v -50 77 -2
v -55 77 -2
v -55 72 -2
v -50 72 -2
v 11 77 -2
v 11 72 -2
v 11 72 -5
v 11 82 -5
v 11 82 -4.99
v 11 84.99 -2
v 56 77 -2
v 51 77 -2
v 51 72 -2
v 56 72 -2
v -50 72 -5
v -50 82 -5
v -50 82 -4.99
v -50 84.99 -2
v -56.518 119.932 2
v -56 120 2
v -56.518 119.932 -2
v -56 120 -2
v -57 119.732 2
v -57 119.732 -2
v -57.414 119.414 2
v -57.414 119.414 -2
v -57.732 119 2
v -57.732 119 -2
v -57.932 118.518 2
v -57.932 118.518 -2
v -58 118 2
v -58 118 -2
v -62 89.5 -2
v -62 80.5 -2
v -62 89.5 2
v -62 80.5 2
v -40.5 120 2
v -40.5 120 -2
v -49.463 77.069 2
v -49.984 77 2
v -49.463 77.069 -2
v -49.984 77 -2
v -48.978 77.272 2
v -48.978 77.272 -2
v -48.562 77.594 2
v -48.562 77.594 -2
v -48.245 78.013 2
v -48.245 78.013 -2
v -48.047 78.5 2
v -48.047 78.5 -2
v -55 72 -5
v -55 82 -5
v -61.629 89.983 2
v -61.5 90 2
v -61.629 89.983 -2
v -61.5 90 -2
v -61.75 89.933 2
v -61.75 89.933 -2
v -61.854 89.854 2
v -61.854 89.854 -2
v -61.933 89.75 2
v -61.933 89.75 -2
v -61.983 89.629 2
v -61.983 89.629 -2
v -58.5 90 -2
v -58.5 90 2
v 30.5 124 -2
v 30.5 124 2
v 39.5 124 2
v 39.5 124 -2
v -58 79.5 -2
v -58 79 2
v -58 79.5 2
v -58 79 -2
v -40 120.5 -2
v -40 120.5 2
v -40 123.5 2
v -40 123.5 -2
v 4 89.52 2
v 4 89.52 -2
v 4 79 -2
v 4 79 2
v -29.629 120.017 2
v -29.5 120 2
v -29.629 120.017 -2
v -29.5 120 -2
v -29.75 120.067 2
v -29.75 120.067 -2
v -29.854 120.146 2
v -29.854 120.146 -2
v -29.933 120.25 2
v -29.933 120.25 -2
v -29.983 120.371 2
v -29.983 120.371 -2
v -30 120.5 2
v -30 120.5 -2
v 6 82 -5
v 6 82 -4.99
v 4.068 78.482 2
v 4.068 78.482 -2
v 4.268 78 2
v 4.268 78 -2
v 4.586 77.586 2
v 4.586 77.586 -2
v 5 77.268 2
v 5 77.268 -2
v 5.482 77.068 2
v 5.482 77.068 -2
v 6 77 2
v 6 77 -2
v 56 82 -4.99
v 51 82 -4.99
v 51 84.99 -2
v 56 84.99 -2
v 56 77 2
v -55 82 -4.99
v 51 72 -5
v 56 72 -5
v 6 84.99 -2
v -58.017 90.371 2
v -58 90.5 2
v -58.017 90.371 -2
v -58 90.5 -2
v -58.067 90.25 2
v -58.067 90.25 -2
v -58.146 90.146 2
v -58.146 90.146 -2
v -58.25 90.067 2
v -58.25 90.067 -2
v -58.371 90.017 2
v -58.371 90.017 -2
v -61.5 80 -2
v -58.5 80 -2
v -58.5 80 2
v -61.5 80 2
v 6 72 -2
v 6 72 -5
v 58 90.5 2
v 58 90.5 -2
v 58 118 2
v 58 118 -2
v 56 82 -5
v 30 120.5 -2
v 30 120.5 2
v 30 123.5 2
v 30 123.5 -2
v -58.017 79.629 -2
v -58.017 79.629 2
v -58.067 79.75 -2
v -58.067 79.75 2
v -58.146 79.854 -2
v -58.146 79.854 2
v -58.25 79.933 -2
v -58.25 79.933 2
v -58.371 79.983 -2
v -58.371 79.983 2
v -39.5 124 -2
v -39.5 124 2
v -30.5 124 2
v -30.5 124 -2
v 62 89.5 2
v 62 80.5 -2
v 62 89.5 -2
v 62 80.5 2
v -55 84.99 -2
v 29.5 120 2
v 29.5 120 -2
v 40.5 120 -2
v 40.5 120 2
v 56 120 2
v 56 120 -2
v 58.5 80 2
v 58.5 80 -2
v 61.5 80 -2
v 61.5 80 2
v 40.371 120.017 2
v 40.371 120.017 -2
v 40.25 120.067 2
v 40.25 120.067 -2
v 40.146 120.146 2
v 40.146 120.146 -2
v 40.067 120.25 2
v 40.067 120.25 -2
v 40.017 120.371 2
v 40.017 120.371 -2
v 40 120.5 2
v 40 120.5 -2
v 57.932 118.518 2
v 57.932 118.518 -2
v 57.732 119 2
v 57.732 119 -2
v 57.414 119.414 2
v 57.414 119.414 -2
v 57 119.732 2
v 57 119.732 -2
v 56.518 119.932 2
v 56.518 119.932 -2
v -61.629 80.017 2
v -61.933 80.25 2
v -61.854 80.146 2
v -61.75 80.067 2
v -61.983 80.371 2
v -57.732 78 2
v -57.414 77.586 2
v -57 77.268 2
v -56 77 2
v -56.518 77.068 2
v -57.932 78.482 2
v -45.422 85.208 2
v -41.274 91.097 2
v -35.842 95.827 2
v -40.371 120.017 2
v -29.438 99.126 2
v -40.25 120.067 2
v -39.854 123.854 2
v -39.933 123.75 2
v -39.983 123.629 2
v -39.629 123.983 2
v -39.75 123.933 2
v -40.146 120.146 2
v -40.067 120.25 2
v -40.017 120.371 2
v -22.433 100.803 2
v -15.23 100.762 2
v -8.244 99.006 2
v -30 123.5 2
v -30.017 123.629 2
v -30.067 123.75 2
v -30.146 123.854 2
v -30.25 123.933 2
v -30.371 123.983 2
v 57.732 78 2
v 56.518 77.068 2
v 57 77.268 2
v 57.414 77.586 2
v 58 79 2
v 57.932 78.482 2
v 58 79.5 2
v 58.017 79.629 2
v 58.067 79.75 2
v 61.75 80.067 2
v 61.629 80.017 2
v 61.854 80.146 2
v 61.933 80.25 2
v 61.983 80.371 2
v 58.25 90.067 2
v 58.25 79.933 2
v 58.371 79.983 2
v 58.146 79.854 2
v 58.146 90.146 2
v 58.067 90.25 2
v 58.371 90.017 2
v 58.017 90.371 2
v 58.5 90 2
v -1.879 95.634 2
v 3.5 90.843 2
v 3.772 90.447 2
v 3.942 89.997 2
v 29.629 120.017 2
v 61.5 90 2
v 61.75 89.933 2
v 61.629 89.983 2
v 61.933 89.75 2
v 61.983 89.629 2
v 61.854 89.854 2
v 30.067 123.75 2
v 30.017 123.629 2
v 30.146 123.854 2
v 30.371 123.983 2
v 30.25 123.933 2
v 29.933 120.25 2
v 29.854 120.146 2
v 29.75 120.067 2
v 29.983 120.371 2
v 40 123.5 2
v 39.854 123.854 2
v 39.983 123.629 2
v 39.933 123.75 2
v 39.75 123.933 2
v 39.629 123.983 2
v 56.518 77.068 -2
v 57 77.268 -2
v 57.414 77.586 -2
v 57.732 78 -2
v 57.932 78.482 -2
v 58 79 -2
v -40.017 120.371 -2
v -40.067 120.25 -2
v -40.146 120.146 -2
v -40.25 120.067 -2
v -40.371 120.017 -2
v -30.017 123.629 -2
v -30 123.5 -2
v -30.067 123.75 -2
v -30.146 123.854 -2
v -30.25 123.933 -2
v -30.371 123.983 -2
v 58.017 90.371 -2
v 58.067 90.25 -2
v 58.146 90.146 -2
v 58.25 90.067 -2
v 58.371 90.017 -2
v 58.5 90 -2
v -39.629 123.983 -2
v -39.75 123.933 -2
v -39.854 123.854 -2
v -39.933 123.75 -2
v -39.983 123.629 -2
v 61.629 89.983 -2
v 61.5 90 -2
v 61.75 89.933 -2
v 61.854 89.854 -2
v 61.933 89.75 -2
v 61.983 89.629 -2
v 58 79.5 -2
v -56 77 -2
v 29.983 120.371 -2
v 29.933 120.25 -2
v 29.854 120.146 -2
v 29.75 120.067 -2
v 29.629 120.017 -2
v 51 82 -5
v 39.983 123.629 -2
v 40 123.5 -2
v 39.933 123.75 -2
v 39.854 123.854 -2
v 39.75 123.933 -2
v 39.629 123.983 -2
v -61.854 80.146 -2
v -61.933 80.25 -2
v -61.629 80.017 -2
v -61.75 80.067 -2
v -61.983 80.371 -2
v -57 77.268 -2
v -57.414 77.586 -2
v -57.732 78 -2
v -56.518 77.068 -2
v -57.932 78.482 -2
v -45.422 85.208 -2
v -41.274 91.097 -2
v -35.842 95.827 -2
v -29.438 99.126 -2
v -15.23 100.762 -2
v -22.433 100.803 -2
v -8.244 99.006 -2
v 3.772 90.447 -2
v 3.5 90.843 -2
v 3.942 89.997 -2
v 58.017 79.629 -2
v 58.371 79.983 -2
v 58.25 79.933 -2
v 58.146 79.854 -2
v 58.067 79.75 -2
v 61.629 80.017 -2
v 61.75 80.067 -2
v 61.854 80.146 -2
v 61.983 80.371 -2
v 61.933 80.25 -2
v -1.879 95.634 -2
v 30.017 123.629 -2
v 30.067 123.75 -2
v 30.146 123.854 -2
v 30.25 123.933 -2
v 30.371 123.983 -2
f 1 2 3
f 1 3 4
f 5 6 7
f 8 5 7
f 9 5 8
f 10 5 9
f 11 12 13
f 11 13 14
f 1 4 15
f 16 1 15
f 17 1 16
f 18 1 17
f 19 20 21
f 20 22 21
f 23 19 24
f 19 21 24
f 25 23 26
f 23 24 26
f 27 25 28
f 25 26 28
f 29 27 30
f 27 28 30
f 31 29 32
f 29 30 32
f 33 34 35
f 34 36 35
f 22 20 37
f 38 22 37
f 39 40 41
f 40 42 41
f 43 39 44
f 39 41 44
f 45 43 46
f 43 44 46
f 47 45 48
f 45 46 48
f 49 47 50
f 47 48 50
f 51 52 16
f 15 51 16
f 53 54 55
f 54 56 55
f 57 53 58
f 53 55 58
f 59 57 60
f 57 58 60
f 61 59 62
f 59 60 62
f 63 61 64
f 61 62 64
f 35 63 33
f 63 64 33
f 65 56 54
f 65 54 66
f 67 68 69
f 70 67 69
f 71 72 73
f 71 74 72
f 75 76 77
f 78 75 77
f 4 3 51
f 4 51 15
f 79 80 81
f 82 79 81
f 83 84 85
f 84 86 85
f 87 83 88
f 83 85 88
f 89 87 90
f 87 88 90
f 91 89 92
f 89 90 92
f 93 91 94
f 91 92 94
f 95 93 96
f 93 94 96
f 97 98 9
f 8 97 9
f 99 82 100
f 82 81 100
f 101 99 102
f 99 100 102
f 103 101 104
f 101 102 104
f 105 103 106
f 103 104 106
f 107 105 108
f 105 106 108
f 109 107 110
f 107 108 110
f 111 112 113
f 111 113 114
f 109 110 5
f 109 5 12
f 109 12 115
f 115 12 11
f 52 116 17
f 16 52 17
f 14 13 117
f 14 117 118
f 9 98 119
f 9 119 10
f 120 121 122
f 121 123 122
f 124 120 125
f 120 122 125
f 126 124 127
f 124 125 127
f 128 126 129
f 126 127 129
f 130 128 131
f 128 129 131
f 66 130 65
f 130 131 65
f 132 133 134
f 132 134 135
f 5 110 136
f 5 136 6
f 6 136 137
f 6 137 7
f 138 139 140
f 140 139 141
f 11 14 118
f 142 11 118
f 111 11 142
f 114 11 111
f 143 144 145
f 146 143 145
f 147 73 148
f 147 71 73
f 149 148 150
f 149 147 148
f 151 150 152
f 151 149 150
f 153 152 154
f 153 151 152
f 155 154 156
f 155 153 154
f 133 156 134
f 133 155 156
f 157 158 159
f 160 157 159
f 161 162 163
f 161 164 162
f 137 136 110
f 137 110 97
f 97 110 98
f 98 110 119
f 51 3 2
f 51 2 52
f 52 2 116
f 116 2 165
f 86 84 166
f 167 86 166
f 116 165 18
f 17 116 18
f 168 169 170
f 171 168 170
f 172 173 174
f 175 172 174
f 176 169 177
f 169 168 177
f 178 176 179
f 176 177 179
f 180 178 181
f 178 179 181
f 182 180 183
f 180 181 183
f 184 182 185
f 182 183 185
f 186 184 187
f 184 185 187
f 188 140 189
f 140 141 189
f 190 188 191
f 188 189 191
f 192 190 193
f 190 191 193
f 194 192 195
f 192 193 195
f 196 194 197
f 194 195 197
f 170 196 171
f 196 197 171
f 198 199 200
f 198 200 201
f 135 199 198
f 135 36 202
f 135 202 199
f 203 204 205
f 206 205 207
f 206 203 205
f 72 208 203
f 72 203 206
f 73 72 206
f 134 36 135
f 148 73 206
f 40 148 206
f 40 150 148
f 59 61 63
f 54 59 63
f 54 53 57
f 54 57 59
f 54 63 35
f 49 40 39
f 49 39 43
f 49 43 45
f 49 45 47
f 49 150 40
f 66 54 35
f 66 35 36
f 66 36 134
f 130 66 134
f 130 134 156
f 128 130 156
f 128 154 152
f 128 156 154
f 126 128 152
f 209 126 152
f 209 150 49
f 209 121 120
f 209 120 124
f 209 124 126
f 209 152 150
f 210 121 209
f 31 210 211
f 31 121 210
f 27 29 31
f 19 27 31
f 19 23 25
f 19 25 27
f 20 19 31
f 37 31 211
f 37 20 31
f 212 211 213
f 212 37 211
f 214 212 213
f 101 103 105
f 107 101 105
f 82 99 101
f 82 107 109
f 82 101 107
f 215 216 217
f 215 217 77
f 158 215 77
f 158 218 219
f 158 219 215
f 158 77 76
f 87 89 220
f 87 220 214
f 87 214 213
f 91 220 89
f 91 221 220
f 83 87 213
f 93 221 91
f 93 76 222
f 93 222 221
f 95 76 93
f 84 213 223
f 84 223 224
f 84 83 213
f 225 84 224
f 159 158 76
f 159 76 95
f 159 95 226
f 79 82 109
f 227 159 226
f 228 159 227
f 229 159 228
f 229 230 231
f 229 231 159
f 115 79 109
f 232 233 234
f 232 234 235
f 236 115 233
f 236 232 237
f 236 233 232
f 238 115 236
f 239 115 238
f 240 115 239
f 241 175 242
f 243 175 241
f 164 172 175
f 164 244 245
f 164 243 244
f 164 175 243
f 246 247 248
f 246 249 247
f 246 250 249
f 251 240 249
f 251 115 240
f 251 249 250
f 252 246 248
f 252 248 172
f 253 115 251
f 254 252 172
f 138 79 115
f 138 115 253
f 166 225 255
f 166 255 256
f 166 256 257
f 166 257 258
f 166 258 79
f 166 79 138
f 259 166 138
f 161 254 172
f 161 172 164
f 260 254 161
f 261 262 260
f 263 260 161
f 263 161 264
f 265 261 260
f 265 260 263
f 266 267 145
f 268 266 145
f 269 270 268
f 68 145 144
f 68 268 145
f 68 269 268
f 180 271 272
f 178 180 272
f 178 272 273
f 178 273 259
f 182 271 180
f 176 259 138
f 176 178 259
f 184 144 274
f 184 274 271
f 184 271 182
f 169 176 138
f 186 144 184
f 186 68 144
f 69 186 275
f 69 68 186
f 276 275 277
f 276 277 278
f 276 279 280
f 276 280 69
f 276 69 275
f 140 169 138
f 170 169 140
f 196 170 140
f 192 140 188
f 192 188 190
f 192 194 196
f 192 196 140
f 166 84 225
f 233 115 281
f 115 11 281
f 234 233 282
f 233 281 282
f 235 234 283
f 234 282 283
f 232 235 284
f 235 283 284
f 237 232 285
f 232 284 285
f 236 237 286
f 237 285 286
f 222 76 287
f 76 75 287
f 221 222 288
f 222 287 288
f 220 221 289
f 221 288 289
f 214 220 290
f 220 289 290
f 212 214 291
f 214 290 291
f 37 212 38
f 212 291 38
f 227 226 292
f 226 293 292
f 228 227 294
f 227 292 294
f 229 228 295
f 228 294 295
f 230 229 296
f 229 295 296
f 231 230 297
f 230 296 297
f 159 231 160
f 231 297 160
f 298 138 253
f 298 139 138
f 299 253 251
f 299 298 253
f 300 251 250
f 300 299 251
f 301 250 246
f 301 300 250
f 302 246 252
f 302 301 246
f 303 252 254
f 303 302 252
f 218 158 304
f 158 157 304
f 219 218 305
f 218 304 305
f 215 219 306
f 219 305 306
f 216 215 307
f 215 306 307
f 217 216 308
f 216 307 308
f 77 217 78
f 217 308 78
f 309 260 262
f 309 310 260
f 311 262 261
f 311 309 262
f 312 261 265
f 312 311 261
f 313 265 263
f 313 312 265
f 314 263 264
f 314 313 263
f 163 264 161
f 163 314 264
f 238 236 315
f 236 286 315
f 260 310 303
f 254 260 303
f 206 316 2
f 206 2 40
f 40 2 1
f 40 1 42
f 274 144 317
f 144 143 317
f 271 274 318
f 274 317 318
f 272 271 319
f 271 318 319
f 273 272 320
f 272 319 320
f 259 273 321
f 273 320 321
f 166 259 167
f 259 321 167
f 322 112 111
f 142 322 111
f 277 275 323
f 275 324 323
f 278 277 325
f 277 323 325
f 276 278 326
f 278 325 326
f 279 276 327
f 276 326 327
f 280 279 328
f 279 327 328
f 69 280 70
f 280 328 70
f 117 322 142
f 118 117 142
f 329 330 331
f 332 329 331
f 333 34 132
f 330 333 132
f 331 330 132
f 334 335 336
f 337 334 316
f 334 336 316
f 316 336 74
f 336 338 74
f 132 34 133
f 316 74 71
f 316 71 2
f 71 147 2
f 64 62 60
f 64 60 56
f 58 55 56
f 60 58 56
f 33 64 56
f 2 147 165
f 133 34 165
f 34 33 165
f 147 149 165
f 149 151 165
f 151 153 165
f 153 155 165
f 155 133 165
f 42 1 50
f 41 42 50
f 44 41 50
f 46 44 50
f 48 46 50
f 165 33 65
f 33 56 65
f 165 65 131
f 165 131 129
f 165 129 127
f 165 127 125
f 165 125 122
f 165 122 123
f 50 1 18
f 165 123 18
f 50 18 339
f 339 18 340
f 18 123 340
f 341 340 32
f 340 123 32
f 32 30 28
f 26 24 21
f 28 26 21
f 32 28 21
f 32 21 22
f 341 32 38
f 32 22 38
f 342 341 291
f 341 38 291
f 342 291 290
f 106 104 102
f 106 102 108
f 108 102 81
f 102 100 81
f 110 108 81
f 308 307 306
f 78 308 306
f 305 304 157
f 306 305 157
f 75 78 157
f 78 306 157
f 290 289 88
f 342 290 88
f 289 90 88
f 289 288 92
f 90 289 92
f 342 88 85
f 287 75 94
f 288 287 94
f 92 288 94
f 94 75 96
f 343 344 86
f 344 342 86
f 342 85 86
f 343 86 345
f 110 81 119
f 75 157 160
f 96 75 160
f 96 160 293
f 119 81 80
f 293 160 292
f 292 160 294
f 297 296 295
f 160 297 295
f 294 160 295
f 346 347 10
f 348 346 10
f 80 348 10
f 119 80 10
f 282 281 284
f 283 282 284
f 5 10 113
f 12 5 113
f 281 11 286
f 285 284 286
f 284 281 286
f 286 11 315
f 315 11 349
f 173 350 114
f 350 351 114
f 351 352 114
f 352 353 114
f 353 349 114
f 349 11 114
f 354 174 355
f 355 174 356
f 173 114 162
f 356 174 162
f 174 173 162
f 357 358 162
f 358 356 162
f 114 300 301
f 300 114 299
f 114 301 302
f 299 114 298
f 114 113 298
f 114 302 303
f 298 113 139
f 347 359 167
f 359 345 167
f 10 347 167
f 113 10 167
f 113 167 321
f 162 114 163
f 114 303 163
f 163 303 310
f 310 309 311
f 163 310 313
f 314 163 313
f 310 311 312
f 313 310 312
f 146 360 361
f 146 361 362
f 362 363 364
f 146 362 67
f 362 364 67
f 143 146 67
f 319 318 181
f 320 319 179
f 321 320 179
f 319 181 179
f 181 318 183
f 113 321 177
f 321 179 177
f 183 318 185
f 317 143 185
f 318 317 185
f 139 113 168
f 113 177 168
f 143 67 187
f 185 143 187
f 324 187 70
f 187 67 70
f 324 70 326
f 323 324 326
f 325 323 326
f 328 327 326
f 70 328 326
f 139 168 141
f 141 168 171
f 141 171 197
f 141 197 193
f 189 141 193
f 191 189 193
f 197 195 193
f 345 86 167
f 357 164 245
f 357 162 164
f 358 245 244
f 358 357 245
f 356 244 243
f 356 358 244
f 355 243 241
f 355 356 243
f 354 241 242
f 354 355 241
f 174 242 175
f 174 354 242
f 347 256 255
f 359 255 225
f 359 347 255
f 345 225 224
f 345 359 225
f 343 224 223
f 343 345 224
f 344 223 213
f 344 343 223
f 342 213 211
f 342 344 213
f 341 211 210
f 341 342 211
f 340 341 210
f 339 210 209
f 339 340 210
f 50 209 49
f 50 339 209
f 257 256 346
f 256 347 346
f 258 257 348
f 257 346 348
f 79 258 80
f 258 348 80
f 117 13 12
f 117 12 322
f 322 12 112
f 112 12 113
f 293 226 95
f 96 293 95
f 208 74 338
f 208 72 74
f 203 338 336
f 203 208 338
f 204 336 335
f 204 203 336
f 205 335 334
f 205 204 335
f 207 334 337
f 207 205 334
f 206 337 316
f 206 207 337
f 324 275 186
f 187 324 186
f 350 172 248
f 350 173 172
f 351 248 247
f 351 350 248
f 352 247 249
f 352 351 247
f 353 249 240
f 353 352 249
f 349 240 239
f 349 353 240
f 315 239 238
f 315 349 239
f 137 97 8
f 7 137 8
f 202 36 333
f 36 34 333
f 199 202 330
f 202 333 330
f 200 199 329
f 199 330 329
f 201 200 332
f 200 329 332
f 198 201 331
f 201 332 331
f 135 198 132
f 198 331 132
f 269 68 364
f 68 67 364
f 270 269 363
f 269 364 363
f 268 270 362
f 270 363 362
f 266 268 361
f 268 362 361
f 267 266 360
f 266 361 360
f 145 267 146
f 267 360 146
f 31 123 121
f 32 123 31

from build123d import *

# Parameters (mm, degrees)
SKETCH_W             = 124
SKETCH_H             = 124
PAD_DEPTH            = 2
POCKET_DEPTH         = 2.001
POCKET_DEPTH_BACK    = -2.001
POCKET001_DEPTH      = 2.001
POCKET001_DEPTH_BACK = -2.001
SKETCH006_W          = 150
SKETCH006_H          = 77
POCKET002_DEPTH      = 2.001
POCKET002_DEPTH_BACK = -2.001
POCKET003_DEPTH      = 2.001
POCKET003_DEPTH_BACK = -2.001
FILLET_R             = 2
FILLET001_R          = 2
FILLET002_R          = 0.5
SKETCH008_W          = 5
SKETCH008_H          = 10
PAD001_DEPTH         = 3
CHAMFER_SIZE         = 2.99


with BuildPart() as part:
    # Sketch → Pad (new body, symmetric)
    with BuildSketch(Plane.XY):
        with Locations((0, 62)):
            Rectangle(SKETCH_W, SKETCH_H)
    extrude(amount=PAD_DEPTH, both=True)

    # Sketch004 → Pocket (cut, two sides)
    with BuildSketch(Plane.XY) as pocket_sk:
        Polygon((-58, 5), (-62, 5), (-62, 15), (-58, 15), (-58, 80), (-62, 80), (-62, 90), (-58, 90), (-58, 124), (-88, 124), (-88, 0), (-58, 0), align=None)
        Polygon((58, 5), (62, 5), (62, 15), (58, 15), (58, 80), (62, 80), (62, 90), (58, 90), (58, 124), (88, 124), (88, 0), (58, 0), align=None)
    extrude(amount=-POCKET_DEPTH, mode=Mode.SUBTRACT)
    extrude(pocket_sk.sketch, amount=-POCKET_DEPTH_BACK, mode=Mode.SUBTRACT)

    # Sketch005 → Pocket001 (cut, two sides)
    with BuildSketch(Plane.XY) as pocket001_sk:
        Polygon((-60, 120), (-40, 120), (-40, 124), (-30, 124), (-30, 120), (30, 120), (30, 124), (40, 124), (40, 120), (60, 120), (60, 130), (-60, 130), align=None)
    extrude(amount=-POCKET001_DEPTH, mode=Mode.SUBTRACT)
    extrude(pocket001_sk.sketch, amount=-POCKET001_DEPTH_BACK, mode=Mode.SUBTRACT)

    # Sketch006 → Pocket002 (cut, two sides)
    with BuildSketch(Plane.XY) as pocket002_sk:
        with Locations((0, 38.5)):
            Rectangle(SKETCH006_W, SKETCH006_H)
    extrude(amount=-POCKET002_DEPTH, mode=Mode.SUBTRACT)
    extrude(pocket002_sk.sketch, amount=-POCKET002_DEPTH_BACK, mode=Mode.SUBTRACT)

    # Sketch007 → Pocket003 (cut, two sides)
    with BuildSketch(Plane.XY) as pocket003_sk:
        with BuildLine():
            ThreePointArc((4, 90.26136), (-49, 71), (4, 51.73864))
            Line((4, 90.26136), (4, 51.73864))
        make_face()
    extrude(amount=-POCKET003_DEPTH, mode=Mode.SUBTRACT)
    extrude(pocket003_sk.sketch, amount=-POCKET003_DEPTH_BACK, mode=Mode.SUBTRACT)

    # Fillet
    fillet_edges = [part.edges().sort_by_distance(p)[0] for p in [
        (-48.393877, 77, 0),
        (4, 90.26136, 0),
        (4, 77, 0),
        (58, 77, 0),
        (-58, 77, 0),
    ]]
    fillet(fillet_edges, radius=FILLET_R)

    # Fillet001
    fillet001_edges = [part.edges().sort_by_distance(p)[0] for p in [
        (58, 120, 0),
        (-58, 120, 0),
    ]]
    fillet(fillet001_edges, radius=FILLET001_R)

    # Fillet002
    fillet002_edges = [part.edges().sort_by_distance(p)[0] for p in [
        (-58, 80, 0),
        (-62, 80, 0),
        (-62, 90, 0),
        (-58, 90, 0),
        (-40, 120, 0),
        (-40, 124, 0),
        (-30, 124, 0),
        (-30, 120, 0),
        (30, 120, 0),
        (30, 124, 0),
        (40, 124, 0),
        (40, 120, 0),
        (58, 90, 0),
        (62, 90, 0),
        (62, 80, 0),
        (58, 80, 0),
    ]]
    fillet(fillet002_edges, radius=FILLET002_R)

    # Sketch008 (on DatumPlane) → Pad001 (join)
    with BuildSketch(Plane.XY.offset(-2)):
        with Locations((-52.5, 77)):
            Rectangle(SKETCH008_W, SKETCH008_H)
        with Locations((8.5, 77)):
            Rectangle(SKETCH008_W, SKETCH008_H)
        with Locations((53.5, 77)):
            Rectangle(SKETCH008_W, SKETCH008_H)
    extrude(amount=-PAD001_DEPTH)

    # Chamfer
    chamfer_edges = [part.edges().sort_by_distance(p)[0] for p in [
        (-52.5, 82, -2),
        (8.5, 82, -2),
        (53.5, 82, -2),
    ]]
    chamfer(chamfer_edges, length=CHAMFER_SIZE)


solid = part.part
